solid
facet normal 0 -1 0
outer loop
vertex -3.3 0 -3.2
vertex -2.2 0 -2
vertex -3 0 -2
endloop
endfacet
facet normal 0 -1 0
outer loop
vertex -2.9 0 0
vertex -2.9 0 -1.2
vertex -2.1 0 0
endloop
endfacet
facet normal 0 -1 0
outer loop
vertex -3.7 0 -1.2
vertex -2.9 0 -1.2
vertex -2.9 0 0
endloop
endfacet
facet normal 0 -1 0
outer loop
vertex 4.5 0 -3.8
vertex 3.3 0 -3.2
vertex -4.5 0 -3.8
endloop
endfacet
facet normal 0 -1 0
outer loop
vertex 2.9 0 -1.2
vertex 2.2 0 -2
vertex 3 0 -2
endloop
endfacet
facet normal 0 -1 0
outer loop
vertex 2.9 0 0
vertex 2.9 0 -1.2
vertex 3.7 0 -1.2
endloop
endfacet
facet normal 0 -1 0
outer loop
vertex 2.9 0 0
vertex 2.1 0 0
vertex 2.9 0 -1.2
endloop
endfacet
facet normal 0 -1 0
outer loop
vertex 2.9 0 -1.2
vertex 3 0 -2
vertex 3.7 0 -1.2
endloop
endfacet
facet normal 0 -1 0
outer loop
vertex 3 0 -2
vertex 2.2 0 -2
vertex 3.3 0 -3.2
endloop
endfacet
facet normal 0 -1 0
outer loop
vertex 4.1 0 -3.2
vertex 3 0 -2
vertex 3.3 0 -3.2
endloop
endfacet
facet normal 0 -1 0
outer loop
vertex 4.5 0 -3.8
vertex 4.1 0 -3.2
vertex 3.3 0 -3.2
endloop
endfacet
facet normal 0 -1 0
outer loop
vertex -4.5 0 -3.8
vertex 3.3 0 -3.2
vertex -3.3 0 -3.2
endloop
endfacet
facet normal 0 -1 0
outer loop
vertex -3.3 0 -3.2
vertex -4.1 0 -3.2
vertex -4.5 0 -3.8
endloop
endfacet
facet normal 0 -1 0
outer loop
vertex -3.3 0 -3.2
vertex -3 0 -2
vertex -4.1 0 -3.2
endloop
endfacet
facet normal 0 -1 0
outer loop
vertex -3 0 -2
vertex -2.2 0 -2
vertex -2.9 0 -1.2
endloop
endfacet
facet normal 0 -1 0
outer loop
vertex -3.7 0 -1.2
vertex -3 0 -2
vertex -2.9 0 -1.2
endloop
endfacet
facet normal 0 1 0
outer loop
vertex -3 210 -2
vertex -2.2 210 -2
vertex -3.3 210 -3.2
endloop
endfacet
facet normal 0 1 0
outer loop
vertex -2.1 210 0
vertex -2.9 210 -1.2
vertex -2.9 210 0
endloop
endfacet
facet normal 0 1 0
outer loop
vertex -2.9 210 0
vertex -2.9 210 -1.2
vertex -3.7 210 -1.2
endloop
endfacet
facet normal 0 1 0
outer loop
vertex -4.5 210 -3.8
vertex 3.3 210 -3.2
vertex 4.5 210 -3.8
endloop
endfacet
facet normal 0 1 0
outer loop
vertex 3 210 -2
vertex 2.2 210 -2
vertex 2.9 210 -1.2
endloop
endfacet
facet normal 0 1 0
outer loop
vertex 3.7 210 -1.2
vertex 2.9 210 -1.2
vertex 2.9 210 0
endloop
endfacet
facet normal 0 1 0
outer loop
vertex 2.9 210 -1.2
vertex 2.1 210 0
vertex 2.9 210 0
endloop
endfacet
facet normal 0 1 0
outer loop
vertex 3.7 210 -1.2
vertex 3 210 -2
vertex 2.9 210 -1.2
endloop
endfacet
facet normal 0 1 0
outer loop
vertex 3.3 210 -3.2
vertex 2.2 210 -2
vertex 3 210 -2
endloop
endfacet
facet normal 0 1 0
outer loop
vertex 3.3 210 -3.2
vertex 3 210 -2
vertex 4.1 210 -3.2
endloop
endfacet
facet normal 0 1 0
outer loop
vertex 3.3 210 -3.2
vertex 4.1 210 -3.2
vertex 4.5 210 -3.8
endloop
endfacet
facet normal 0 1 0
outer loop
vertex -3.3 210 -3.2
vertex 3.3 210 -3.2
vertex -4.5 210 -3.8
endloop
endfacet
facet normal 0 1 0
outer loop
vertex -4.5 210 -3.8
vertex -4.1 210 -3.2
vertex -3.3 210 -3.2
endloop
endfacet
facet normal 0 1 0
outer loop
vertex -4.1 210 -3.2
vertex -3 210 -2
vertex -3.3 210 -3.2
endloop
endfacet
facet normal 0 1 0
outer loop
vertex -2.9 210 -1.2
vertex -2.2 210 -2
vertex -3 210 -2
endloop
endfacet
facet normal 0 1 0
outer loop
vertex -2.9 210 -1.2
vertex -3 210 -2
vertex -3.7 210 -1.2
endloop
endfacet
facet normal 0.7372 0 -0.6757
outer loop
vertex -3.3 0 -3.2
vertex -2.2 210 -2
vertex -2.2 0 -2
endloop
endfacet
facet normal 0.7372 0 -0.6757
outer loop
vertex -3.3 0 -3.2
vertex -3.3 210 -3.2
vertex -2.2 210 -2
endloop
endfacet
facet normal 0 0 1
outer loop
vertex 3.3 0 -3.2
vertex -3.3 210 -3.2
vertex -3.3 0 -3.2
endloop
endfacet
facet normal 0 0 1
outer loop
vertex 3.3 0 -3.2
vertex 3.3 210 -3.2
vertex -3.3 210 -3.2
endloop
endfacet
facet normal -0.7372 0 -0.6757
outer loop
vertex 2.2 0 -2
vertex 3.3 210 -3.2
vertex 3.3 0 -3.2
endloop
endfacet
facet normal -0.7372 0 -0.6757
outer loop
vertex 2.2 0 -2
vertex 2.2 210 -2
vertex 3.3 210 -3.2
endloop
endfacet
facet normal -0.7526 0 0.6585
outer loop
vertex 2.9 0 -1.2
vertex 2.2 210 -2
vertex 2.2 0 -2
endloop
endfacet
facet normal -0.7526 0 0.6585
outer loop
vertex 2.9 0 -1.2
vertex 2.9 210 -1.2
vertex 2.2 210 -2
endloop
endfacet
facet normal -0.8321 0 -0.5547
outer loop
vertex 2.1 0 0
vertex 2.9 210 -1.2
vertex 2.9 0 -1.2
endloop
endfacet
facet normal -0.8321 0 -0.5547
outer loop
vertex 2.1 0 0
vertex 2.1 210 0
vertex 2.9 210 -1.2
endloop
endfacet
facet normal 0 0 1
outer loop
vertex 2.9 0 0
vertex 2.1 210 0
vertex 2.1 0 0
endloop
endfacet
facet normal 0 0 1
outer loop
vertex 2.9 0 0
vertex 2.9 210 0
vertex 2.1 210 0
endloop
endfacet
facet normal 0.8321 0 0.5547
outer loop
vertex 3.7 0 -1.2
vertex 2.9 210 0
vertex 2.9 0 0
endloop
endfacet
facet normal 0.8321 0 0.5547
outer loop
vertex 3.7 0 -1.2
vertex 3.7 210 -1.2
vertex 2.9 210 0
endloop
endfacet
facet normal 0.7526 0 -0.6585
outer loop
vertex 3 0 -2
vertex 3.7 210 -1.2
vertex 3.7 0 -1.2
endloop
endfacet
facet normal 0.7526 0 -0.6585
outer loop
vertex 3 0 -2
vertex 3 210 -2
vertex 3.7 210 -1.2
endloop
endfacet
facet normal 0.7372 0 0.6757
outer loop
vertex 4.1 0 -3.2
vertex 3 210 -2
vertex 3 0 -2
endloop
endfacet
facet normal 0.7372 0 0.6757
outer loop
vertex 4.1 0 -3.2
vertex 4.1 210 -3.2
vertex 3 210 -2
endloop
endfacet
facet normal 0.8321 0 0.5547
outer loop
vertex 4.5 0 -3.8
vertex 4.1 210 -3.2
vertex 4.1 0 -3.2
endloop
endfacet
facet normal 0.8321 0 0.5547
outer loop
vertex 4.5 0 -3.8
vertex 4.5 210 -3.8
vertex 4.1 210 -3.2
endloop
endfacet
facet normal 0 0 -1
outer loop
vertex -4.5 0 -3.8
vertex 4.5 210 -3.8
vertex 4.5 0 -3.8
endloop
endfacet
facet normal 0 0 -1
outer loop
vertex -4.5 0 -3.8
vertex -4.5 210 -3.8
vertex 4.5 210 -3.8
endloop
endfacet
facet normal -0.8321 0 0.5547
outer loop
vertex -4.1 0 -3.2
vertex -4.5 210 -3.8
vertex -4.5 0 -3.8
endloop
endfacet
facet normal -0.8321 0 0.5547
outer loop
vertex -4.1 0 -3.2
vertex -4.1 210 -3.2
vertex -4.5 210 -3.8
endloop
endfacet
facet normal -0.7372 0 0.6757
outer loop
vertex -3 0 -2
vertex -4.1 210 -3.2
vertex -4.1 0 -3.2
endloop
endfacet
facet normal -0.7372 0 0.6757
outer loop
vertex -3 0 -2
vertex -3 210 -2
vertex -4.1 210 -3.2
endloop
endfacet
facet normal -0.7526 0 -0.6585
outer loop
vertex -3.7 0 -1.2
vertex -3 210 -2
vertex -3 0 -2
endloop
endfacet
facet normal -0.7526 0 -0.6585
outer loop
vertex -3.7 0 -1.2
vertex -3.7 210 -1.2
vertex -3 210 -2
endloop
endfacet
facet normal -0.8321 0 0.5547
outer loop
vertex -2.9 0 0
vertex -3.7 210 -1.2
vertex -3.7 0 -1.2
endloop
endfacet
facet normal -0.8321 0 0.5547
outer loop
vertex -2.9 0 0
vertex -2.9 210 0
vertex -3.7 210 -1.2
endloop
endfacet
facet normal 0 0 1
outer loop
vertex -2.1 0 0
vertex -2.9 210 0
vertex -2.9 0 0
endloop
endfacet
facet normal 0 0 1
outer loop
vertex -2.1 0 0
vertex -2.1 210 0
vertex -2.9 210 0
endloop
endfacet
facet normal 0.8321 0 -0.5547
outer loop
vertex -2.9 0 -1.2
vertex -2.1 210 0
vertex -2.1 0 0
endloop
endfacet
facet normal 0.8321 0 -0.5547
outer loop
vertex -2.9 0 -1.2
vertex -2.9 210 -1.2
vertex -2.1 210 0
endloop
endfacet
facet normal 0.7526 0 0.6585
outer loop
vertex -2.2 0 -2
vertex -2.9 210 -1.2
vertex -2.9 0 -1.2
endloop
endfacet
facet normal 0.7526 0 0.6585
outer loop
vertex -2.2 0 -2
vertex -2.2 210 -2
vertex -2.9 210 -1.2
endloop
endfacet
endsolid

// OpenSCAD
length = 210; // [3:0.1:500]

// conver extension on one side
// leave it 0 (zero) if you don't need it
side_extension_width = 0; // [0:0.1:20]

/* HIDDEN */
side_add_w = side_extension_width;

$fn=1*60;

top2_w = 1*9.0;
top_w = 1*8.2; // 9.2 -v2> 9.6 -v3> 10
w1 = 1*8.2;
w2 = 1*6;
w3 = 1*7.4; // 8 -v2> 7.4
bottom_w = 1*5.8;

h1 = 1*4 - 0.8; // 3.8 -v4> 4.0
h2 = 1*2;
h3 = 1*1.2;
h_top_cover = 1*0.6;

wall_thick = 1*0.8; // 
tb_thick = 1*0; // top-bottom thickness 0.8 -v3> 0.4 -v4> 0

// MAIN

rotate([-90,0,0])
linear_extrude(height = length) {
	difference() {
		polygon(points=[[-bottom_w/2, 0],
						[-w3/2, h3],
						[-w2/2, h2],
						[-w1/2, h1],
						[-top_w/2, h1],
						[-top2_w/2, h1 + h_top_cover],
						[top2_w/2 + side_add_w, h1 + h_top_cover],
						[top_w/2 + side_add_w, h1],
						[w1/2, h1],
						[w2/2, h2],
						[w3/2, h3],
						[bottom_w/2, 0]]);

		polygon(points=[[-bottom_w/2 + wall_thick, tb_thick],
						[-w3/2 + wall_thick, h3],
						[-w2/2 + wall_thick, h2],
						[-w1/2 + wall_thick, h1],
						[w1/2 - wall_thick, h1],
						[w2/2 - wall_thick, h2],
						[w3/2 - wall_thick, h3],
						[bottom_w/2 - wall_thick, tb_thick]]);
	}			
		
}
